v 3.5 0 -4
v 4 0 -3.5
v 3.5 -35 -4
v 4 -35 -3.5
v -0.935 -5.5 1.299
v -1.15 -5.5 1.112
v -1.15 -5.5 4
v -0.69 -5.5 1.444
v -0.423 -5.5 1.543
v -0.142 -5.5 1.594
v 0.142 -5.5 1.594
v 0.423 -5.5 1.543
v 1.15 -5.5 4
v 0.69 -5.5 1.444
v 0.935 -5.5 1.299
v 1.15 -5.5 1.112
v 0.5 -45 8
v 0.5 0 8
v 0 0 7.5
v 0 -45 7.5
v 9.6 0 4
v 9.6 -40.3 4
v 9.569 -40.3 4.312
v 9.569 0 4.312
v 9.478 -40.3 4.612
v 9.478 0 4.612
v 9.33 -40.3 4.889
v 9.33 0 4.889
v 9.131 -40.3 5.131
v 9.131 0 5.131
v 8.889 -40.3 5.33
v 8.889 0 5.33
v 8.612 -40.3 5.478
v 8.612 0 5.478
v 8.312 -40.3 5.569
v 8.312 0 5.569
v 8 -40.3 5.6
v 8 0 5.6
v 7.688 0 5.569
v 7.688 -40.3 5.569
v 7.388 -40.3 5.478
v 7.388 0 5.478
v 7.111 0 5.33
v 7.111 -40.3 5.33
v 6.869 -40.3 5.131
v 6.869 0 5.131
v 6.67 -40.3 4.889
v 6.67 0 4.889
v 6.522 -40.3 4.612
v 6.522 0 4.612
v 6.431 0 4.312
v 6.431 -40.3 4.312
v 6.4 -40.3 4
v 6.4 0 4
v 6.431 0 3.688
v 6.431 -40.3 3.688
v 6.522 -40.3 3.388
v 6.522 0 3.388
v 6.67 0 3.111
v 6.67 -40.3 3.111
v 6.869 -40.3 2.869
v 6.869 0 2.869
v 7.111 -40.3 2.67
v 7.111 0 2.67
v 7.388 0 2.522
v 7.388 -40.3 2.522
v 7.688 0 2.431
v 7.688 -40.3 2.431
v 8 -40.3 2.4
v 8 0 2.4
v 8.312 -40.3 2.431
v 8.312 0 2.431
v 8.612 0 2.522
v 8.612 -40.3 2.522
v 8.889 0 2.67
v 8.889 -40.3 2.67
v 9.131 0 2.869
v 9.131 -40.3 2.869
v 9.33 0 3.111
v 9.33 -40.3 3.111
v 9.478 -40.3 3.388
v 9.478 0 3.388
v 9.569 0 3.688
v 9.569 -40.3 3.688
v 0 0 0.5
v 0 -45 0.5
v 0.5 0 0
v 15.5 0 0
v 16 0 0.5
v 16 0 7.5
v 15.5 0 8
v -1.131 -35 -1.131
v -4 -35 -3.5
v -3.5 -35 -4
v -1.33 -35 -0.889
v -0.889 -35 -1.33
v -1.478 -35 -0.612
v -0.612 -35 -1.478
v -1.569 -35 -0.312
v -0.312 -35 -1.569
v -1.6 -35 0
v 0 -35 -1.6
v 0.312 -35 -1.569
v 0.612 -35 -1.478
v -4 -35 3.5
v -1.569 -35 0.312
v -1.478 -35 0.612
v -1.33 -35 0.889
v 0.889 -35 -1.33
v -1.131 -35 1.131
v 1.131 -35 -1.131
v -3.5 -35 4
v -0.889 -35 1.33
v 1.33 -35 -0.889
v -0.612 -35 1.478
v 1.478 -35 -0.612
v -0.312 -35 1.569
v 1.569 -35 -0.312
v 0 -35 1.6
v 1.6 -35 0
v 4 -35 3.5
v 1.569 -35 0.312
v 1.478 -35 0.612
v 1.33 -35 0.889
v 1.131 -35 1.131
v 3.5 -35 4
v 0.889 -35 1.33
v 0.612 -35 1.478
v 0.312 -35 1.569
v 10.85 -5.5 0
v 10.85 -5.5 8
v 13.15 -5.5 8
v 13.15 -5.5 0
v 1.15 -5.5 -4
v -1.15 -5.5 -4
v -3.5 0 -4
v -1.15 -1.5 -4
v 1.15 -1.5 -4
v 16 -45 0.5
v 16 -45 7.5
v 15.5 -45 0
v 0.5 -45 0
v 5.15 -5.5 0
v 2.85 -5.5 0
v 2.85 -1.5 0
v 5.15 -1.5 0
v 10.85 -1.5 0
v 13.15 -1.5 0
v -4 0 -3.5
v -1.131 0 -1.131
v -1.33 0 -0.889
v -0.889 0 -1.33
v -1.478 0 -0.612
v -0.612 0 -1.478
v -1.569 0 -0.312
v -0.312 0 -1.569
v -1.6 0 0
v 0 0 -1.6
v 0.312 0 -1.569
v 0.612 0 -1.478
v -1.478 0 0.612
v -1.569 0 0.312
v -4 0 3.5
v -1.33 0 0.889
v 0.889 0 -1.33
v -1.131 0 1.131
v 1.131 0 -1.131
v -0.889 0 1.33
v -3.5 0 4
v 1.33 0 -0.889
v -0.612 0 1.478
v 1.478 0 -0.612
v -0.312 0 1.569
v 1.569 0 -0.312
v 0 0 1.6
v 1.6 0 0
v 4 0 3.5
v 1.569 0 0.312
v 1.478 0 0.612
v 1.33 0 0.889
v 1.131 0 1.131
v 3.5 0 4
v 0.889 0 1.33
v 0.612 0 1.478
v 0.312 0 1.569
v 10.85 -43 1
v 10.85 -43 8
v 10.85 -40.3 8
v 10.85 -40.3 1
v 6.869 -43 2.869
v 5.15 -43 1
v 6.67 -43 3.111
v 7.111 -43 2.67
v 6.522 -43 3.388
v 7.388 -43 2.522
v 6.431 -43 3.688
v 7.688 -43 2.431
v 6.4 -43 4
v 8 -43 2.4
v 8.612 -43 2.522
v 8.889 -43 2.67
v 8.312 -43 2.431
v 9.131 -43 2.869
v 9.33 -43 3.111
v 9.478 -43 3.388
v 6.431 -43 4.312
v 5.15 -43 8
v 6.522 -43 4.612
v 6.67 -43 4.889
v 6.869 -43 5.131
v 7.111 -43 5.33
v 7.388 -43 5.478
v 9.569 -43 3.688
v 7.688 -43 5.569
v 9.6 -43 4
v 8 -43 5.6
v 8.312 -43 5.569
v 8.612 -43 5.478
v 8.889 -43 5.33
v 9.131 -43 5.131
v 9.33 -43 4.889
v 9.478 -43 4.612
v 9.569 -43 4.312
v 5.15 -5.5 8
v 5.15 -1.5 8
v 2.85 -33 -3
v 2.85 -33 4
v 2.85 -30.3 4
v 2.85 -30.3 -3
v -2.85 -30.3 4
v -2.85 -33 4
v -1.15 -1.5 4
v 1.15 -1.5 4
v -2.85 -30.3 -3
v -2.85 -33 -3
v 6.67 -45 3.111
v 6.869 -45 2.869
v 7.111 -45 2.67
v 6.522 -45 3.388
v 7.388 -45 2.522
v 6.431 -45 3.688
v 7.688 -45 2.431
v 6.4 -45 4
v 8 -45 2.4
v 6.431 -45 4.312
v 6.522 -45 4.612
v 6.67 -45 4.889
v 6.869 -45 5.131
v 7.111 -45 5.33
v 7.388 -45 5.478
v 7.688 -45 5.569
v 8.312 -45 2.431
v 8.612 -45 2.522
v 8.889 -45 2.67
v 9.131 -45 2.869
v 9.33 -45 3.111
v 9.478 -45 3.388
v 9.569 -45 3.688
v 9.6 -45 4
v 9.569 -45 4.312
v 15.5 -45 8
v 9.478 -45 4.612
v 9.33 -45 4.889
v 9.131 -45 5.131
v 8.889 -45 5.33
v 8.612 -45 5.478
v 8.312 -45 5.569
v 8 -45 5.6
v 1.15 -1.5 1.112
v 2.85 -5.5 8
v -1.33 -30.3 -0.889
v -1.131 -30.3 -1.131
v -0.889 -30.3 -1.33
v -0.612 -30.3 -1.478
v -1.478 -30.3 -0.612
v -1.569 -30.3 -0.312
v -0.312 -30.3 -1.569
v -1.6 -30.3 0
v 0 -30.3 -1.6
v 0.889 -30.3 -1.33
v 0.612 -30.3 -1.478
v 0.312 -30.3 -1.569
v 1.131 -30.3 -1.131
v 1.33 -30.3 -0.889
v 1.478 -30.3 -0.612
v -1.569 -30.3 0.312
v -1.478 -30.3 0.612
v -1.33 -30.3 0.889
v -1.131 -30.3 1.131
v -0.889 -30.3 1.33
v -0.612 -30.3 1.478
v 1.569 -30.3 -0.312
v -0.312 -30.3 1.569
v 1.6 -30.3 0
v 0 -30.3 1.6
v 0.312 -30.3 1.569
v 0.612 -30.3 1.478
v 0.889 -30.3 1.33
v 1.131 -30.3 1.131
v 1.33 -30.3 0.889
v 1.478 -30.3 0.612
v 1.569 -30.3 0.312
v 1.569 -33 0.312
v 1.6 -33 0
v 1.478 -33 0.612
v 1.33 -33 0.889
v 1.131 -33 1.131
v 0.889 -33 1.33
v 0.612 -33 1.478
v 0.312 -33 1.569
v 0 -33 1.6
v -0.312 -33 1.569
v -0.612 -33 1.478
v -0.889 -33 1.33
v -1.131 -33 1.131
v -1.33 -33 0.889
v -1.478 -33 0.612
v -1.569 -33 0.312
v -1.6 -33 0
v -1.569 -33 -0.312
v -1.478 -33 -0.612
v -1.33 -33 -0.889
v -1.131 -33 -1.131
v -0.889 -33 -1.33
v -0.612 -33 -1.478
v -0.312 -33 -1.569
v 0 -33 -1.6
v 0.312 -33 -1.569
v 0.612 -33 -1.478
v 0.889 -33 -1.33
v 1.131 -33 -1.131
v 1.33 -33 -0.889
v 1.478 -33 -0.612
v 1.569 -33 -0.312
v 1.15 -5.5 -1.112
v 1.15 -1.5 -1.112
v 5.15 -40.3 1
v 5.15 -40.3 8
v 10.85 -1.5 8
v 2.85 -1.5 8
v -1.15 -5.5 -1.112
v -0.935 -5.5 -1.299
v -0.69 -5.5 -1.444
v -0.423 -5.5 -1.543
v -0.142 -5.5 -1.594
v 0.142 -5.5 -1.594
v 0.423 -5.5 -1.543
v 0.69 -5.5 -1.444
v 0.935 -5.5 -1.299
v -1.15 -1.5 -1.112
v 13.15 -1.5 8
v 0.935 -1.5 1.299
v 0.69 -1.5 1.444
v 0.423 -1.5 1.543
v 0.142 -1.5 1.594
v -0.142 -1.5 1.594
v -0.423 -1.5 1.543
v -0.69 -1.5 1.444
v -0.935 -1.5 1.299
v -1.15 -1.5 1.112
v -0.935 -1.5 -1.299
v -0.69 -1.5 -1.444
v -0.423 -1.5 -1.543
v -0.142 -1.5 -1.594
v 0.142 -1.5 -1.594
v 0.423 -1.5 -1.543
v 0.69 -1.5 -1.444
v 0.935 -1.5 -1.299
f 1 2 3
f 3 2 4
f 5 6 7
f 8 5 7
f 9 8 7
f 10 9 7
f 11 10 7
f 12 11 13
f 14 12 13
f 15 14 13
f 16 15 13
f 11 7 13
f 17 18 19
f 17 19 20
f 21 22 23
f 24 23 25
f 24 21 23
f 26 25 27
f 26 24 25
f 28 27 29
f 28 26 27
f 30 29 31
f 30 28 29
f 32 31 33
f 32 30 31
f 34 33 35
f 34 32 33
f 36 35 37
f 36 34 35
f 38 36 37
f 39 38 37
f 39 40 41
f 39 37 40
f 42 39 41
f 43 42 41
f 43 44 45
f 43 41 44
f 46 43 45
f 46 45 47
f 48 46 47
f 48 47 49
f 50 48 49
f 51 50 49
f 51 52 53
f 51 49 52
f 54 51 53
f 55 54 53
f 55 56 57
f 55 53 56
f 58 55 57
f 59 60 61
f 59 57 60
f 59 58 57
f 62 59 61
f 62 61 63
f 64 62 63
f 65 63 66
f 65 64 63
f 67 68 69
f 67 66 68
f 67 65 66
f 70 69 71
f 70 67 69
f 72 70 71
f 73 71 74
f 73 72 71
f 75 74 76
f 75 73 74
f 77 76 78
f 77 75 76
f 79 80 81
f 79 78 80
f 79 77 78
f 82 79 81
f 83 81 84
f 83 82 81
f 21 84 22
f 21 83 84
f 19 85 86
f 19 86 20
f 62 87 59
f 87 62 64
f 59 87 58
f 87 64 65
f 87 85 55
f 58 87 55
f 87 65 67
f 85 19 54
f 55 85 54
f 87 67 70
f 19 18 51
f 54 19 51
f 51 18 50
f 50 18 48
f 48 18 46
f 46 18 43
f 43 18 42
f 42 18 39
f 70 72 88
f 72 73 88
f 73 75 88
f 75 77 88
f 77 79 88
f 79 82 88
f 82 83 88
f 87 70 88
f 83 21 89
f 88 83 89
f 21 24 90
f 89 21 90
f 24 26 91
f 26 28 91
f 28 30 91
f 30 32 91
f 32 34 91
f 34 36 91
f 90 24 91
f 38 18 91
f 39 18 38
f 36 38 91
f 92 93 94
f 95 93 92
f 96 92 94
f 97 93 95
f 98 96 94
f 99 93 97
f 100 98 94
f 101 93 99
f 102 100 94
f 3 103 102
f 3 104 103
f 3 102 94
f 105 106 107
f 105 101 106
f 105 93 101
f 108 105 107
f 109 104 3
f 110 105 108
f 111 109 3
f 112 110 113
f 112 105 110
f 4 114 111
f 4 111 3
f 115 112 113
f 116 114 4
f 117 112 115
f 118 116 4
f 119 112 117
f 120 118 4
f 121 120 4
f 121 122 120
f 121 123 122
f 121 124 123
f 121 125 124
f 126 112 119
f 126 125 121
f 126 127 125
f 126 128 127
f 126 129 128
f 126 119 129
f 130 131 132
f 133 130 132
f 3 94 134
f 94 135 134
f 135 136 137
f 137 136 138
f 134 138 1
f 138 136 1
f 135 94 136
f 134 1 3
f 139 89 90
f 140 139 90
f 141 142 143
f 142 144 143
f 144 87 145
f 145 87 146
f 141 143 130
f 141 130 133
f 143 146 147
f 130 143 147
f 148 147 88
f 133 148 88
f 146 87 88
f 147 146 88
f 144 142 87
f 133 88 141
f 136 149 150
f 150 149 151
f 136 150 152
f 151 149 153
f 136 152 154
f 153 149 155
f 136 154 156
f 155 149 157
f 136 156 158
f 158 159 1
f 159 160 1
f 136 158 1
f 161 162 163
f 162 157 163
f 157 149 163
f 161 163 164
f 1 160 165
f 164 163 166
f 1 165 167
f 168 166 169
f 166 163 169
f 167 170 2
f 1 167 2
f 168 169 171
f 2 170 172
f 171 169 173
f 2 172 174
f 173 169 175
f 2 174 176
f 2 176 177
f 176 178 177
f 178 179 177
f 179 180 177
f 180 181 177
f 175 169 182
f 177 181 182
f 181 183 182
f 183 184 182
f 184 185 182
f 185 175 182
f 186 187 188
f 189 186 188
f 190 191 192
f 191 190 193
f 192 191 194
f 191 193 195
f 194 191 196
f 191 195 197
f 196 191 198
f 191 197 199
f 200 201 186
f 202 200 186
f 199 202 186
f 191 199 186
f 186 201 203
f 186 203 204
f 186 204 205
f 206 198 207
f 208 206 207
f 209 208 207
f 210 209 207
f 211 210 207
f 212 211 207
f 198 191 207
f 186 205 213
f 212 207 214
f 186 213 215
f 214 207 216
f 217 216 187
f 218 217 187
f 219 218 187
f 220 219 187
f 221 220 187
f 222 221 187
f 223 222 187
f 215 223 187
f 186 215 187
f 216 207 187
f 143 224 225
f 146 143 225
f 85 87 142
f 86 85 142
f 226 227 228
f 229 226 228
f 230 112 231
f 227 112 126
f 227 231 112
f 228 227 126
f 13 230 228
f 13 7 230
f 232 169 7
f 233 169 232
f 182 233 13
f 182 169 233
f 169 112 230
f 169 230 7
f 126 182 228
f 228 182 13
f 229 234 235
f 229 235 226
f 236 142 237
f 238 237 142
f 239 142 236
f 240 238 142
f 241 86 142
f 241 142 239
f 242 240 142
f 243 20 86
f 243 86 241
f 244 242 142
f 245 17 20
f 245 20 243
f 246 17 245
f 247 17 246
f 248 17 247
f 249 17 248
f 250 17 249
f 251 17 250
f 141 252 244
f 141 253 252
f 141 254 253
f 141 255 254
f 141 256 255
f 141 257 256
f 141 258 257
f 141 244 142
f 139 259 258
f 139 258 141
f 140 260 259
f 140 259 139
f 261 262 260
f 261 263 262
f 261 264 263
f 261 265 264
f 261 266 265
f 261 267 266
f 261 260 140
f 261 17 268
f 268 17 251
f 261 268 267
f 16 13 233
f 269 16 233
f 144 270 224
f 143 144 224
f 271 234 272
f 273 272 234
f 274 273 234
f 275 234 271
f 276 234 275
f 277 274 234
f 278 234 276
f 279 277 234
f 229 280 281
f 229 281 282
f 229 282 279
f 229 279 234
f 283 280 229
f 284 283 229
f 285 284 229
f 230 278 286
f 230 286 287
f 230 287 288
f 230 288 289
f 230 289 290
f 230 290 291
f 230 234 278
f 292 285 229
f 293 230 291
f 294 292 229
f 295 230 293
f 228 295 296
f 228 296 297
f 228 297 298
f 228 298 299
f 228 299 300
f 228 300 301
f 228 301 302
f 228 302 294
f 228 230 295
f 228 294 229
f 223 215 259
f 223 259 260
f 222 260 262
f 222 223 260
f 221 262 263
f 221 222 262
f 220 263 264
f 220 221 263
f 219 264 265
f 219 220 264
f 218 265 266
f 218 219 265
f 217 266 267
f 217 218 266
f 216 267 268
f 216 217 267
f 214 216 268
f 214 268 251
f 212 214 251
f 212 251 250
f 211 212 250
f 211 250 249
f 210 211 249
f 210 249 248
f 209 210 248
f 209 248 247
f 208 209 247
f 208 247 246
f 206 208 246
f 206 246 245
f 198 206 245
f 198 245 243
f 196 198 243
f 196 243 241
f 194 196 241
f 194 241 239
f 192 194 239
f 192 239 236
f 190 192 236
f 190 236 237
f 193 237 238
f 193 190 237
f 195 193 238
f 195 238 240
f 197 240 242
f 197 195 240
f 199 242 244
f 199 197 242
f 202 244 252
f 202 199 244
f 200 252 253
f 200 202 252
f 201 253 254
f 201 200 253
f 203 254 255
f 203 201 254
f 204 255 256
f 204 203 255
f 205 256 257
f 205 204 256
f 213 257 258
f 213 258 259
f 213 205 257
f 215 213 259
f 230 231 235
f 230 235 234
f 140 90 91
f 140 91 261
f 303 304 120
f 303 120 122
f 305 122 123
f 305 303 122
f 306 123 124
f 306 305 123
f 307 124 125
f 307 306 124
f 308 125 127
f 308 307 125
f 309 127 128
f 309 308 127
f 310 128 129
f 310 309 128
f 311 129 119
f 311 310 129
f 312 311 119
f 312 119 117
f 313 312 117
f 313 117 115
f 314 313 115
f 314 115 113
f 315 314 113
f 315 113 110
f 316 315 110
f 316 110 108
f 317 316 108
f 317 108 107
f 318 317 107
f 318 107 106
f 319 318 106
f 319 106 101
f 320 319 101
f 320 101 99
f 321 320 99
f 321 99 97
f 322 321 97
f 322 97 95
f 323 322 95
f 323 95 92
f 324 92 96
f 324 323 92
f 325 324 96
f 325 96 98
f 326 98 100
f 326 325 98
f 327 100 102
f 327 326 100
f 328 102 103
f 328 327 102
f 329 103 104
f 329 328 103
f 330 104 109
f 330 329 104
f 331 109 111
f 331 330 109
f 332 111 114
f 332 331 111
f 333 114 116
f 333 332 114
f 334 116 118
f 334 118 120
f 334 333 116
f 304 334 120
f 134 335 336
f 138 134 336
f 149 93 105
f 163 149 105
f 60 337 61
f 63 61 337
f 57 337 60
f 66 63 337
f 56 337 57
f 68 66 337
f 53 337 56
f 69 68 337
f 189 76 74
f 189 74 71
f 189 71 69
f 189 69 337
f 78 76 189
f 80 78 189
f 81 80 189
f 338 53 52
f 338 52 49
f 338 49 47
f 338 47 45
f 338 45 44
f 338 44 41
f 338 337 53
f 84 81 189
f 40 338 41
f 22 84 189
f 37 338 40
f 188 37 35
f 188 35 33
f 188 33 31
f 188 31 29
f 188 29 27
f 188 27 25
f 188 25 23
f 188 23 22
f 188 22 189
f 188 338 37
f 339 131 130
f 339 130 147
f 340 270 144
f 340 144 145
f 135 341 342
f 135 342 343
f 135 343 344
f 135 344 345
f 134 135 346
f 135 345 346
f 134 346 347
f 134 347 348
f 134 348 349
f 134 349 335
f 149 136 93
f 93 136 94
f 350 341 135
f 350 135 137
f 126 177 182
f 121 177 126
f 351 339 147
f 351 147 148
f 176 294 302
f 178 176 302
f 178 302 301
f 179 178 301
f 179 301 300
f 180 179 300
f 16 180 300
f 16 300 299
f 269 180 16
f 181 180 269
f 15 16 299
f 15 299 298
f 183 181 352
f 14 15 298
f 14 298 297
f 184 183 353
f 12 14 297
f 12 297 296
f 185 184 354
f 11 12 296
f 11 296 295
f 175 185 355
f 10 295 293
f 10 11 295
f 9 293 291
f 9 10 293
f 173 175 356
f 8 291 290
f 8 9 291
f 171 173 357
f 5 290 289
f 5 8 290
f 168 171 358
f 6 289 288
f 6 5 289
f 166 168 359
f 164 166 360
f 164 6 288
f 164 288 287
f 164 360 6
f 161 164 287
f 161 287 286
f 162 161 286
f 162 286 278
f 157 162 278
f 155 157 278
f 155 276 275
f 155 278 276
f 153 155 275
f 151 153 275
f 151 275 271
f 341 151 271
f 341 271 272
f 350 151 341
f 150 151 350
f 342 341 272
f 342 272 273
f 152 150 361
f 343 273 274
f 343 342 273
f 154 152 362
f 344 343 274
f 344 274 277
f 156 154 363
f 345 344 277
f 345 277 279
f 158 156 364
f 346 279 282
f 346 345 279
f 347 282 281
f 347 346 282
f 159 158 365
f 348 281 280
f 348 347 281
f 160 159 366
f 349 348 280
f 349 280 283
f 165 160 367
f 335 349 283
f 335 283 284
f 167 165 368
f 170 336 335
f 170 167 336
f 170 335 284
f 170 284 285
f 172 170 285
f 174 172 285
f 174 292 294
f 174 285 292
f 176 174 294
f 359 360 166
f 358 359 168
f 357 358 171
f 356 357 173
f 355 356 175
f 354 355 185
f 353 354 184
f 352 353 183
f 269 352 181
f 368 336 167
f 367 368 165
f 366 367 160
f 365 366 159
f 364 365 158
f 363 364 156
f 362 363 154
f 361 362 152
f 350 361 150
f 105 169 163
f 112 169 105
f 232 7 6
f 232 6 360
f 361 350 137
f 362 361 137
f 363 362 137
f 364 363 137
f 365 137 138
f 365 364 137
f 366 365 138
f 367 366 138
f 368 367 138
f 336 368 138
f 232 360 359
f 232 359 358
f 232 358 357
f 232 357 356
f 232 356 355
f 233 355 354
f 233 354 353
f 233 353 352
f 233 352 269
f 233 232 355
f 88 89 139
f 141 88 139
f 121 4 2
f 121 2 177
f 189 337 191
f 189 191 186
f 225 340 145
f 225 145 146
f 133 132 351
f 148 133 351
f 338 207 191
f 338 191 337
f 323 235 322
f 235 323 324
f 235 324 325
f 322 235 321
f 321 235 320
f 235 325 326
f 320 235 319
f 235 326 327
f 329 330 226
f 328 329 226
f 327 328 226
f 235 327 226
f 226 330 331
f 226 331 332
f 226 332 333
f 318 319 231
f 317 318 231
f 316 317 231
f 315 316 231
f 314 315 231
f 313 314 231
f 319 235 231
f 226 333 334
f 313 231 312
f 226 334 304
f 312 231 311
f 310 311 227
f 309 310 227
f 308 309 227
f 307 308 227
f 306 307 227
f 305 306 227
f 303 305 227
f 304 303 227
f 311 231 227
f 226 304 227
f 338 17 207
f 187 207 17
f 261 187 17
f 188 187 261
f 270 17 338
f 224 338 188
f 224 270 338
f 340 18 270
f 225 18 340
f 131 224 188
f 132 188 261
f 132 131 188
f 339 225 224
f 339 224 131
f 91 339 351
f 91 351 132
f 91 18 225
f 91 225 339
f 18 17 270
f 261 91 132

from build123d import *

# Parameters (mm, degrees)
F0_W      = 8
F0_H      = 8
F0_R      = 1.6
F1_DEPTH  = 35
F2_W      = 5.7
F2_H      = 2.7
F3_DEPTH  = 7
F4_W      = 2.3
F4_H      = 4
F5_DEPTH  = 8.001
F6_SIZE   = 0.5
F7_W      = 16
F7_H      = 8
F7_R      = 1.6
F8_DEPTH  = 45
F9_W      = 5.7
F9_H      = 2.7
F10_DEPTH = 7
F11_SIZE  = 0.5
F12_W     = 2.3
F12_H     = 4
F13_DEPTH = 12.001


with BuildPart() as f1:
    # F0 (on Front) → F1 (new body)
    with BuildSketch(Plane.XZ):
        Rectangle(F0_W, F0_H)
        Circle(F0_R, mode=Mode.SUBTRACT)
    extrude(amount=F1_DEPTH)

    # F2 (on face) → F3 (cut)
    with BuildSketch(Plane.XY.offset(4)):
        with Locations((0, -31.65)):
            Rectangle(F2_W, F2_H)
    extrude(amount=-F3_DEPTH, mode=Mode.SUBTRACT)

    # F4 (on face) → F5 (cut, through all)
    with BuildSketch(Plane.XY.offset(4)):
        with Locations((0, -3.5)):
            Rectangle(F4_W, F4_H)
    extrude(amount=-F5_DEPTH, mode=Mode.SUBTRACT)

    # F6
    f6_edges = [f1.edges().sort_by_distance(p)[0] for p in [
        (-4, -17.5, 4),
        (4, -17.5, 4),
        (-4, -17.5, -4),
        (4, -17.5, -4),
    ]]
    chamfer(f6_edges, length=F6_SIZE)


with BuildPart() as f8:
    # F7 (on Front) → F8 (new body)
    with BuildSketch(Plane.XZ):
        with Locations((8, 4)):
            Rectangle(F7_W, F7_H)
        with Locations((8, 4)):
            Circle(F7_R, mode=Mode.SUBTRACT)
    extrude(amount=F8_DEPTH)

    # F9 (on face) → F10 (cut)
    with BuildSketch(Plane.XY.offset(8)):
        with Locations((8, -41.65)):
            Rectangle(F9_W, F9_H)
    extrude(amount=-F10_DEPTH, mode=Mode.SUBTRACT)

    # F11
    f11_edges = [f8.edges().sort_by_distance(p)[0] for p in [
        (0, -22.5, 8),
        (16, -22.5, 8),
        (16, -22.5, 0),
        (0, -22.5, 0),
    ]]
    chamfer(f11_edges, length=F11_SIZE)

    # F12 (on face) → F13 (cut, through all)
    with BuildSketch(Plane.XY.offset(8)):
        with Locations((4, -3.5)):
            Rectangle(F12_W, F12_H)
        with Locations((12, -3.5)):
            Rectangle(F12_W, F12_H)
    extrude(amount=-F13_DEPTH, mode=Mode.SUBTRACT)


solid = Compound([f1.part, f8.part])
